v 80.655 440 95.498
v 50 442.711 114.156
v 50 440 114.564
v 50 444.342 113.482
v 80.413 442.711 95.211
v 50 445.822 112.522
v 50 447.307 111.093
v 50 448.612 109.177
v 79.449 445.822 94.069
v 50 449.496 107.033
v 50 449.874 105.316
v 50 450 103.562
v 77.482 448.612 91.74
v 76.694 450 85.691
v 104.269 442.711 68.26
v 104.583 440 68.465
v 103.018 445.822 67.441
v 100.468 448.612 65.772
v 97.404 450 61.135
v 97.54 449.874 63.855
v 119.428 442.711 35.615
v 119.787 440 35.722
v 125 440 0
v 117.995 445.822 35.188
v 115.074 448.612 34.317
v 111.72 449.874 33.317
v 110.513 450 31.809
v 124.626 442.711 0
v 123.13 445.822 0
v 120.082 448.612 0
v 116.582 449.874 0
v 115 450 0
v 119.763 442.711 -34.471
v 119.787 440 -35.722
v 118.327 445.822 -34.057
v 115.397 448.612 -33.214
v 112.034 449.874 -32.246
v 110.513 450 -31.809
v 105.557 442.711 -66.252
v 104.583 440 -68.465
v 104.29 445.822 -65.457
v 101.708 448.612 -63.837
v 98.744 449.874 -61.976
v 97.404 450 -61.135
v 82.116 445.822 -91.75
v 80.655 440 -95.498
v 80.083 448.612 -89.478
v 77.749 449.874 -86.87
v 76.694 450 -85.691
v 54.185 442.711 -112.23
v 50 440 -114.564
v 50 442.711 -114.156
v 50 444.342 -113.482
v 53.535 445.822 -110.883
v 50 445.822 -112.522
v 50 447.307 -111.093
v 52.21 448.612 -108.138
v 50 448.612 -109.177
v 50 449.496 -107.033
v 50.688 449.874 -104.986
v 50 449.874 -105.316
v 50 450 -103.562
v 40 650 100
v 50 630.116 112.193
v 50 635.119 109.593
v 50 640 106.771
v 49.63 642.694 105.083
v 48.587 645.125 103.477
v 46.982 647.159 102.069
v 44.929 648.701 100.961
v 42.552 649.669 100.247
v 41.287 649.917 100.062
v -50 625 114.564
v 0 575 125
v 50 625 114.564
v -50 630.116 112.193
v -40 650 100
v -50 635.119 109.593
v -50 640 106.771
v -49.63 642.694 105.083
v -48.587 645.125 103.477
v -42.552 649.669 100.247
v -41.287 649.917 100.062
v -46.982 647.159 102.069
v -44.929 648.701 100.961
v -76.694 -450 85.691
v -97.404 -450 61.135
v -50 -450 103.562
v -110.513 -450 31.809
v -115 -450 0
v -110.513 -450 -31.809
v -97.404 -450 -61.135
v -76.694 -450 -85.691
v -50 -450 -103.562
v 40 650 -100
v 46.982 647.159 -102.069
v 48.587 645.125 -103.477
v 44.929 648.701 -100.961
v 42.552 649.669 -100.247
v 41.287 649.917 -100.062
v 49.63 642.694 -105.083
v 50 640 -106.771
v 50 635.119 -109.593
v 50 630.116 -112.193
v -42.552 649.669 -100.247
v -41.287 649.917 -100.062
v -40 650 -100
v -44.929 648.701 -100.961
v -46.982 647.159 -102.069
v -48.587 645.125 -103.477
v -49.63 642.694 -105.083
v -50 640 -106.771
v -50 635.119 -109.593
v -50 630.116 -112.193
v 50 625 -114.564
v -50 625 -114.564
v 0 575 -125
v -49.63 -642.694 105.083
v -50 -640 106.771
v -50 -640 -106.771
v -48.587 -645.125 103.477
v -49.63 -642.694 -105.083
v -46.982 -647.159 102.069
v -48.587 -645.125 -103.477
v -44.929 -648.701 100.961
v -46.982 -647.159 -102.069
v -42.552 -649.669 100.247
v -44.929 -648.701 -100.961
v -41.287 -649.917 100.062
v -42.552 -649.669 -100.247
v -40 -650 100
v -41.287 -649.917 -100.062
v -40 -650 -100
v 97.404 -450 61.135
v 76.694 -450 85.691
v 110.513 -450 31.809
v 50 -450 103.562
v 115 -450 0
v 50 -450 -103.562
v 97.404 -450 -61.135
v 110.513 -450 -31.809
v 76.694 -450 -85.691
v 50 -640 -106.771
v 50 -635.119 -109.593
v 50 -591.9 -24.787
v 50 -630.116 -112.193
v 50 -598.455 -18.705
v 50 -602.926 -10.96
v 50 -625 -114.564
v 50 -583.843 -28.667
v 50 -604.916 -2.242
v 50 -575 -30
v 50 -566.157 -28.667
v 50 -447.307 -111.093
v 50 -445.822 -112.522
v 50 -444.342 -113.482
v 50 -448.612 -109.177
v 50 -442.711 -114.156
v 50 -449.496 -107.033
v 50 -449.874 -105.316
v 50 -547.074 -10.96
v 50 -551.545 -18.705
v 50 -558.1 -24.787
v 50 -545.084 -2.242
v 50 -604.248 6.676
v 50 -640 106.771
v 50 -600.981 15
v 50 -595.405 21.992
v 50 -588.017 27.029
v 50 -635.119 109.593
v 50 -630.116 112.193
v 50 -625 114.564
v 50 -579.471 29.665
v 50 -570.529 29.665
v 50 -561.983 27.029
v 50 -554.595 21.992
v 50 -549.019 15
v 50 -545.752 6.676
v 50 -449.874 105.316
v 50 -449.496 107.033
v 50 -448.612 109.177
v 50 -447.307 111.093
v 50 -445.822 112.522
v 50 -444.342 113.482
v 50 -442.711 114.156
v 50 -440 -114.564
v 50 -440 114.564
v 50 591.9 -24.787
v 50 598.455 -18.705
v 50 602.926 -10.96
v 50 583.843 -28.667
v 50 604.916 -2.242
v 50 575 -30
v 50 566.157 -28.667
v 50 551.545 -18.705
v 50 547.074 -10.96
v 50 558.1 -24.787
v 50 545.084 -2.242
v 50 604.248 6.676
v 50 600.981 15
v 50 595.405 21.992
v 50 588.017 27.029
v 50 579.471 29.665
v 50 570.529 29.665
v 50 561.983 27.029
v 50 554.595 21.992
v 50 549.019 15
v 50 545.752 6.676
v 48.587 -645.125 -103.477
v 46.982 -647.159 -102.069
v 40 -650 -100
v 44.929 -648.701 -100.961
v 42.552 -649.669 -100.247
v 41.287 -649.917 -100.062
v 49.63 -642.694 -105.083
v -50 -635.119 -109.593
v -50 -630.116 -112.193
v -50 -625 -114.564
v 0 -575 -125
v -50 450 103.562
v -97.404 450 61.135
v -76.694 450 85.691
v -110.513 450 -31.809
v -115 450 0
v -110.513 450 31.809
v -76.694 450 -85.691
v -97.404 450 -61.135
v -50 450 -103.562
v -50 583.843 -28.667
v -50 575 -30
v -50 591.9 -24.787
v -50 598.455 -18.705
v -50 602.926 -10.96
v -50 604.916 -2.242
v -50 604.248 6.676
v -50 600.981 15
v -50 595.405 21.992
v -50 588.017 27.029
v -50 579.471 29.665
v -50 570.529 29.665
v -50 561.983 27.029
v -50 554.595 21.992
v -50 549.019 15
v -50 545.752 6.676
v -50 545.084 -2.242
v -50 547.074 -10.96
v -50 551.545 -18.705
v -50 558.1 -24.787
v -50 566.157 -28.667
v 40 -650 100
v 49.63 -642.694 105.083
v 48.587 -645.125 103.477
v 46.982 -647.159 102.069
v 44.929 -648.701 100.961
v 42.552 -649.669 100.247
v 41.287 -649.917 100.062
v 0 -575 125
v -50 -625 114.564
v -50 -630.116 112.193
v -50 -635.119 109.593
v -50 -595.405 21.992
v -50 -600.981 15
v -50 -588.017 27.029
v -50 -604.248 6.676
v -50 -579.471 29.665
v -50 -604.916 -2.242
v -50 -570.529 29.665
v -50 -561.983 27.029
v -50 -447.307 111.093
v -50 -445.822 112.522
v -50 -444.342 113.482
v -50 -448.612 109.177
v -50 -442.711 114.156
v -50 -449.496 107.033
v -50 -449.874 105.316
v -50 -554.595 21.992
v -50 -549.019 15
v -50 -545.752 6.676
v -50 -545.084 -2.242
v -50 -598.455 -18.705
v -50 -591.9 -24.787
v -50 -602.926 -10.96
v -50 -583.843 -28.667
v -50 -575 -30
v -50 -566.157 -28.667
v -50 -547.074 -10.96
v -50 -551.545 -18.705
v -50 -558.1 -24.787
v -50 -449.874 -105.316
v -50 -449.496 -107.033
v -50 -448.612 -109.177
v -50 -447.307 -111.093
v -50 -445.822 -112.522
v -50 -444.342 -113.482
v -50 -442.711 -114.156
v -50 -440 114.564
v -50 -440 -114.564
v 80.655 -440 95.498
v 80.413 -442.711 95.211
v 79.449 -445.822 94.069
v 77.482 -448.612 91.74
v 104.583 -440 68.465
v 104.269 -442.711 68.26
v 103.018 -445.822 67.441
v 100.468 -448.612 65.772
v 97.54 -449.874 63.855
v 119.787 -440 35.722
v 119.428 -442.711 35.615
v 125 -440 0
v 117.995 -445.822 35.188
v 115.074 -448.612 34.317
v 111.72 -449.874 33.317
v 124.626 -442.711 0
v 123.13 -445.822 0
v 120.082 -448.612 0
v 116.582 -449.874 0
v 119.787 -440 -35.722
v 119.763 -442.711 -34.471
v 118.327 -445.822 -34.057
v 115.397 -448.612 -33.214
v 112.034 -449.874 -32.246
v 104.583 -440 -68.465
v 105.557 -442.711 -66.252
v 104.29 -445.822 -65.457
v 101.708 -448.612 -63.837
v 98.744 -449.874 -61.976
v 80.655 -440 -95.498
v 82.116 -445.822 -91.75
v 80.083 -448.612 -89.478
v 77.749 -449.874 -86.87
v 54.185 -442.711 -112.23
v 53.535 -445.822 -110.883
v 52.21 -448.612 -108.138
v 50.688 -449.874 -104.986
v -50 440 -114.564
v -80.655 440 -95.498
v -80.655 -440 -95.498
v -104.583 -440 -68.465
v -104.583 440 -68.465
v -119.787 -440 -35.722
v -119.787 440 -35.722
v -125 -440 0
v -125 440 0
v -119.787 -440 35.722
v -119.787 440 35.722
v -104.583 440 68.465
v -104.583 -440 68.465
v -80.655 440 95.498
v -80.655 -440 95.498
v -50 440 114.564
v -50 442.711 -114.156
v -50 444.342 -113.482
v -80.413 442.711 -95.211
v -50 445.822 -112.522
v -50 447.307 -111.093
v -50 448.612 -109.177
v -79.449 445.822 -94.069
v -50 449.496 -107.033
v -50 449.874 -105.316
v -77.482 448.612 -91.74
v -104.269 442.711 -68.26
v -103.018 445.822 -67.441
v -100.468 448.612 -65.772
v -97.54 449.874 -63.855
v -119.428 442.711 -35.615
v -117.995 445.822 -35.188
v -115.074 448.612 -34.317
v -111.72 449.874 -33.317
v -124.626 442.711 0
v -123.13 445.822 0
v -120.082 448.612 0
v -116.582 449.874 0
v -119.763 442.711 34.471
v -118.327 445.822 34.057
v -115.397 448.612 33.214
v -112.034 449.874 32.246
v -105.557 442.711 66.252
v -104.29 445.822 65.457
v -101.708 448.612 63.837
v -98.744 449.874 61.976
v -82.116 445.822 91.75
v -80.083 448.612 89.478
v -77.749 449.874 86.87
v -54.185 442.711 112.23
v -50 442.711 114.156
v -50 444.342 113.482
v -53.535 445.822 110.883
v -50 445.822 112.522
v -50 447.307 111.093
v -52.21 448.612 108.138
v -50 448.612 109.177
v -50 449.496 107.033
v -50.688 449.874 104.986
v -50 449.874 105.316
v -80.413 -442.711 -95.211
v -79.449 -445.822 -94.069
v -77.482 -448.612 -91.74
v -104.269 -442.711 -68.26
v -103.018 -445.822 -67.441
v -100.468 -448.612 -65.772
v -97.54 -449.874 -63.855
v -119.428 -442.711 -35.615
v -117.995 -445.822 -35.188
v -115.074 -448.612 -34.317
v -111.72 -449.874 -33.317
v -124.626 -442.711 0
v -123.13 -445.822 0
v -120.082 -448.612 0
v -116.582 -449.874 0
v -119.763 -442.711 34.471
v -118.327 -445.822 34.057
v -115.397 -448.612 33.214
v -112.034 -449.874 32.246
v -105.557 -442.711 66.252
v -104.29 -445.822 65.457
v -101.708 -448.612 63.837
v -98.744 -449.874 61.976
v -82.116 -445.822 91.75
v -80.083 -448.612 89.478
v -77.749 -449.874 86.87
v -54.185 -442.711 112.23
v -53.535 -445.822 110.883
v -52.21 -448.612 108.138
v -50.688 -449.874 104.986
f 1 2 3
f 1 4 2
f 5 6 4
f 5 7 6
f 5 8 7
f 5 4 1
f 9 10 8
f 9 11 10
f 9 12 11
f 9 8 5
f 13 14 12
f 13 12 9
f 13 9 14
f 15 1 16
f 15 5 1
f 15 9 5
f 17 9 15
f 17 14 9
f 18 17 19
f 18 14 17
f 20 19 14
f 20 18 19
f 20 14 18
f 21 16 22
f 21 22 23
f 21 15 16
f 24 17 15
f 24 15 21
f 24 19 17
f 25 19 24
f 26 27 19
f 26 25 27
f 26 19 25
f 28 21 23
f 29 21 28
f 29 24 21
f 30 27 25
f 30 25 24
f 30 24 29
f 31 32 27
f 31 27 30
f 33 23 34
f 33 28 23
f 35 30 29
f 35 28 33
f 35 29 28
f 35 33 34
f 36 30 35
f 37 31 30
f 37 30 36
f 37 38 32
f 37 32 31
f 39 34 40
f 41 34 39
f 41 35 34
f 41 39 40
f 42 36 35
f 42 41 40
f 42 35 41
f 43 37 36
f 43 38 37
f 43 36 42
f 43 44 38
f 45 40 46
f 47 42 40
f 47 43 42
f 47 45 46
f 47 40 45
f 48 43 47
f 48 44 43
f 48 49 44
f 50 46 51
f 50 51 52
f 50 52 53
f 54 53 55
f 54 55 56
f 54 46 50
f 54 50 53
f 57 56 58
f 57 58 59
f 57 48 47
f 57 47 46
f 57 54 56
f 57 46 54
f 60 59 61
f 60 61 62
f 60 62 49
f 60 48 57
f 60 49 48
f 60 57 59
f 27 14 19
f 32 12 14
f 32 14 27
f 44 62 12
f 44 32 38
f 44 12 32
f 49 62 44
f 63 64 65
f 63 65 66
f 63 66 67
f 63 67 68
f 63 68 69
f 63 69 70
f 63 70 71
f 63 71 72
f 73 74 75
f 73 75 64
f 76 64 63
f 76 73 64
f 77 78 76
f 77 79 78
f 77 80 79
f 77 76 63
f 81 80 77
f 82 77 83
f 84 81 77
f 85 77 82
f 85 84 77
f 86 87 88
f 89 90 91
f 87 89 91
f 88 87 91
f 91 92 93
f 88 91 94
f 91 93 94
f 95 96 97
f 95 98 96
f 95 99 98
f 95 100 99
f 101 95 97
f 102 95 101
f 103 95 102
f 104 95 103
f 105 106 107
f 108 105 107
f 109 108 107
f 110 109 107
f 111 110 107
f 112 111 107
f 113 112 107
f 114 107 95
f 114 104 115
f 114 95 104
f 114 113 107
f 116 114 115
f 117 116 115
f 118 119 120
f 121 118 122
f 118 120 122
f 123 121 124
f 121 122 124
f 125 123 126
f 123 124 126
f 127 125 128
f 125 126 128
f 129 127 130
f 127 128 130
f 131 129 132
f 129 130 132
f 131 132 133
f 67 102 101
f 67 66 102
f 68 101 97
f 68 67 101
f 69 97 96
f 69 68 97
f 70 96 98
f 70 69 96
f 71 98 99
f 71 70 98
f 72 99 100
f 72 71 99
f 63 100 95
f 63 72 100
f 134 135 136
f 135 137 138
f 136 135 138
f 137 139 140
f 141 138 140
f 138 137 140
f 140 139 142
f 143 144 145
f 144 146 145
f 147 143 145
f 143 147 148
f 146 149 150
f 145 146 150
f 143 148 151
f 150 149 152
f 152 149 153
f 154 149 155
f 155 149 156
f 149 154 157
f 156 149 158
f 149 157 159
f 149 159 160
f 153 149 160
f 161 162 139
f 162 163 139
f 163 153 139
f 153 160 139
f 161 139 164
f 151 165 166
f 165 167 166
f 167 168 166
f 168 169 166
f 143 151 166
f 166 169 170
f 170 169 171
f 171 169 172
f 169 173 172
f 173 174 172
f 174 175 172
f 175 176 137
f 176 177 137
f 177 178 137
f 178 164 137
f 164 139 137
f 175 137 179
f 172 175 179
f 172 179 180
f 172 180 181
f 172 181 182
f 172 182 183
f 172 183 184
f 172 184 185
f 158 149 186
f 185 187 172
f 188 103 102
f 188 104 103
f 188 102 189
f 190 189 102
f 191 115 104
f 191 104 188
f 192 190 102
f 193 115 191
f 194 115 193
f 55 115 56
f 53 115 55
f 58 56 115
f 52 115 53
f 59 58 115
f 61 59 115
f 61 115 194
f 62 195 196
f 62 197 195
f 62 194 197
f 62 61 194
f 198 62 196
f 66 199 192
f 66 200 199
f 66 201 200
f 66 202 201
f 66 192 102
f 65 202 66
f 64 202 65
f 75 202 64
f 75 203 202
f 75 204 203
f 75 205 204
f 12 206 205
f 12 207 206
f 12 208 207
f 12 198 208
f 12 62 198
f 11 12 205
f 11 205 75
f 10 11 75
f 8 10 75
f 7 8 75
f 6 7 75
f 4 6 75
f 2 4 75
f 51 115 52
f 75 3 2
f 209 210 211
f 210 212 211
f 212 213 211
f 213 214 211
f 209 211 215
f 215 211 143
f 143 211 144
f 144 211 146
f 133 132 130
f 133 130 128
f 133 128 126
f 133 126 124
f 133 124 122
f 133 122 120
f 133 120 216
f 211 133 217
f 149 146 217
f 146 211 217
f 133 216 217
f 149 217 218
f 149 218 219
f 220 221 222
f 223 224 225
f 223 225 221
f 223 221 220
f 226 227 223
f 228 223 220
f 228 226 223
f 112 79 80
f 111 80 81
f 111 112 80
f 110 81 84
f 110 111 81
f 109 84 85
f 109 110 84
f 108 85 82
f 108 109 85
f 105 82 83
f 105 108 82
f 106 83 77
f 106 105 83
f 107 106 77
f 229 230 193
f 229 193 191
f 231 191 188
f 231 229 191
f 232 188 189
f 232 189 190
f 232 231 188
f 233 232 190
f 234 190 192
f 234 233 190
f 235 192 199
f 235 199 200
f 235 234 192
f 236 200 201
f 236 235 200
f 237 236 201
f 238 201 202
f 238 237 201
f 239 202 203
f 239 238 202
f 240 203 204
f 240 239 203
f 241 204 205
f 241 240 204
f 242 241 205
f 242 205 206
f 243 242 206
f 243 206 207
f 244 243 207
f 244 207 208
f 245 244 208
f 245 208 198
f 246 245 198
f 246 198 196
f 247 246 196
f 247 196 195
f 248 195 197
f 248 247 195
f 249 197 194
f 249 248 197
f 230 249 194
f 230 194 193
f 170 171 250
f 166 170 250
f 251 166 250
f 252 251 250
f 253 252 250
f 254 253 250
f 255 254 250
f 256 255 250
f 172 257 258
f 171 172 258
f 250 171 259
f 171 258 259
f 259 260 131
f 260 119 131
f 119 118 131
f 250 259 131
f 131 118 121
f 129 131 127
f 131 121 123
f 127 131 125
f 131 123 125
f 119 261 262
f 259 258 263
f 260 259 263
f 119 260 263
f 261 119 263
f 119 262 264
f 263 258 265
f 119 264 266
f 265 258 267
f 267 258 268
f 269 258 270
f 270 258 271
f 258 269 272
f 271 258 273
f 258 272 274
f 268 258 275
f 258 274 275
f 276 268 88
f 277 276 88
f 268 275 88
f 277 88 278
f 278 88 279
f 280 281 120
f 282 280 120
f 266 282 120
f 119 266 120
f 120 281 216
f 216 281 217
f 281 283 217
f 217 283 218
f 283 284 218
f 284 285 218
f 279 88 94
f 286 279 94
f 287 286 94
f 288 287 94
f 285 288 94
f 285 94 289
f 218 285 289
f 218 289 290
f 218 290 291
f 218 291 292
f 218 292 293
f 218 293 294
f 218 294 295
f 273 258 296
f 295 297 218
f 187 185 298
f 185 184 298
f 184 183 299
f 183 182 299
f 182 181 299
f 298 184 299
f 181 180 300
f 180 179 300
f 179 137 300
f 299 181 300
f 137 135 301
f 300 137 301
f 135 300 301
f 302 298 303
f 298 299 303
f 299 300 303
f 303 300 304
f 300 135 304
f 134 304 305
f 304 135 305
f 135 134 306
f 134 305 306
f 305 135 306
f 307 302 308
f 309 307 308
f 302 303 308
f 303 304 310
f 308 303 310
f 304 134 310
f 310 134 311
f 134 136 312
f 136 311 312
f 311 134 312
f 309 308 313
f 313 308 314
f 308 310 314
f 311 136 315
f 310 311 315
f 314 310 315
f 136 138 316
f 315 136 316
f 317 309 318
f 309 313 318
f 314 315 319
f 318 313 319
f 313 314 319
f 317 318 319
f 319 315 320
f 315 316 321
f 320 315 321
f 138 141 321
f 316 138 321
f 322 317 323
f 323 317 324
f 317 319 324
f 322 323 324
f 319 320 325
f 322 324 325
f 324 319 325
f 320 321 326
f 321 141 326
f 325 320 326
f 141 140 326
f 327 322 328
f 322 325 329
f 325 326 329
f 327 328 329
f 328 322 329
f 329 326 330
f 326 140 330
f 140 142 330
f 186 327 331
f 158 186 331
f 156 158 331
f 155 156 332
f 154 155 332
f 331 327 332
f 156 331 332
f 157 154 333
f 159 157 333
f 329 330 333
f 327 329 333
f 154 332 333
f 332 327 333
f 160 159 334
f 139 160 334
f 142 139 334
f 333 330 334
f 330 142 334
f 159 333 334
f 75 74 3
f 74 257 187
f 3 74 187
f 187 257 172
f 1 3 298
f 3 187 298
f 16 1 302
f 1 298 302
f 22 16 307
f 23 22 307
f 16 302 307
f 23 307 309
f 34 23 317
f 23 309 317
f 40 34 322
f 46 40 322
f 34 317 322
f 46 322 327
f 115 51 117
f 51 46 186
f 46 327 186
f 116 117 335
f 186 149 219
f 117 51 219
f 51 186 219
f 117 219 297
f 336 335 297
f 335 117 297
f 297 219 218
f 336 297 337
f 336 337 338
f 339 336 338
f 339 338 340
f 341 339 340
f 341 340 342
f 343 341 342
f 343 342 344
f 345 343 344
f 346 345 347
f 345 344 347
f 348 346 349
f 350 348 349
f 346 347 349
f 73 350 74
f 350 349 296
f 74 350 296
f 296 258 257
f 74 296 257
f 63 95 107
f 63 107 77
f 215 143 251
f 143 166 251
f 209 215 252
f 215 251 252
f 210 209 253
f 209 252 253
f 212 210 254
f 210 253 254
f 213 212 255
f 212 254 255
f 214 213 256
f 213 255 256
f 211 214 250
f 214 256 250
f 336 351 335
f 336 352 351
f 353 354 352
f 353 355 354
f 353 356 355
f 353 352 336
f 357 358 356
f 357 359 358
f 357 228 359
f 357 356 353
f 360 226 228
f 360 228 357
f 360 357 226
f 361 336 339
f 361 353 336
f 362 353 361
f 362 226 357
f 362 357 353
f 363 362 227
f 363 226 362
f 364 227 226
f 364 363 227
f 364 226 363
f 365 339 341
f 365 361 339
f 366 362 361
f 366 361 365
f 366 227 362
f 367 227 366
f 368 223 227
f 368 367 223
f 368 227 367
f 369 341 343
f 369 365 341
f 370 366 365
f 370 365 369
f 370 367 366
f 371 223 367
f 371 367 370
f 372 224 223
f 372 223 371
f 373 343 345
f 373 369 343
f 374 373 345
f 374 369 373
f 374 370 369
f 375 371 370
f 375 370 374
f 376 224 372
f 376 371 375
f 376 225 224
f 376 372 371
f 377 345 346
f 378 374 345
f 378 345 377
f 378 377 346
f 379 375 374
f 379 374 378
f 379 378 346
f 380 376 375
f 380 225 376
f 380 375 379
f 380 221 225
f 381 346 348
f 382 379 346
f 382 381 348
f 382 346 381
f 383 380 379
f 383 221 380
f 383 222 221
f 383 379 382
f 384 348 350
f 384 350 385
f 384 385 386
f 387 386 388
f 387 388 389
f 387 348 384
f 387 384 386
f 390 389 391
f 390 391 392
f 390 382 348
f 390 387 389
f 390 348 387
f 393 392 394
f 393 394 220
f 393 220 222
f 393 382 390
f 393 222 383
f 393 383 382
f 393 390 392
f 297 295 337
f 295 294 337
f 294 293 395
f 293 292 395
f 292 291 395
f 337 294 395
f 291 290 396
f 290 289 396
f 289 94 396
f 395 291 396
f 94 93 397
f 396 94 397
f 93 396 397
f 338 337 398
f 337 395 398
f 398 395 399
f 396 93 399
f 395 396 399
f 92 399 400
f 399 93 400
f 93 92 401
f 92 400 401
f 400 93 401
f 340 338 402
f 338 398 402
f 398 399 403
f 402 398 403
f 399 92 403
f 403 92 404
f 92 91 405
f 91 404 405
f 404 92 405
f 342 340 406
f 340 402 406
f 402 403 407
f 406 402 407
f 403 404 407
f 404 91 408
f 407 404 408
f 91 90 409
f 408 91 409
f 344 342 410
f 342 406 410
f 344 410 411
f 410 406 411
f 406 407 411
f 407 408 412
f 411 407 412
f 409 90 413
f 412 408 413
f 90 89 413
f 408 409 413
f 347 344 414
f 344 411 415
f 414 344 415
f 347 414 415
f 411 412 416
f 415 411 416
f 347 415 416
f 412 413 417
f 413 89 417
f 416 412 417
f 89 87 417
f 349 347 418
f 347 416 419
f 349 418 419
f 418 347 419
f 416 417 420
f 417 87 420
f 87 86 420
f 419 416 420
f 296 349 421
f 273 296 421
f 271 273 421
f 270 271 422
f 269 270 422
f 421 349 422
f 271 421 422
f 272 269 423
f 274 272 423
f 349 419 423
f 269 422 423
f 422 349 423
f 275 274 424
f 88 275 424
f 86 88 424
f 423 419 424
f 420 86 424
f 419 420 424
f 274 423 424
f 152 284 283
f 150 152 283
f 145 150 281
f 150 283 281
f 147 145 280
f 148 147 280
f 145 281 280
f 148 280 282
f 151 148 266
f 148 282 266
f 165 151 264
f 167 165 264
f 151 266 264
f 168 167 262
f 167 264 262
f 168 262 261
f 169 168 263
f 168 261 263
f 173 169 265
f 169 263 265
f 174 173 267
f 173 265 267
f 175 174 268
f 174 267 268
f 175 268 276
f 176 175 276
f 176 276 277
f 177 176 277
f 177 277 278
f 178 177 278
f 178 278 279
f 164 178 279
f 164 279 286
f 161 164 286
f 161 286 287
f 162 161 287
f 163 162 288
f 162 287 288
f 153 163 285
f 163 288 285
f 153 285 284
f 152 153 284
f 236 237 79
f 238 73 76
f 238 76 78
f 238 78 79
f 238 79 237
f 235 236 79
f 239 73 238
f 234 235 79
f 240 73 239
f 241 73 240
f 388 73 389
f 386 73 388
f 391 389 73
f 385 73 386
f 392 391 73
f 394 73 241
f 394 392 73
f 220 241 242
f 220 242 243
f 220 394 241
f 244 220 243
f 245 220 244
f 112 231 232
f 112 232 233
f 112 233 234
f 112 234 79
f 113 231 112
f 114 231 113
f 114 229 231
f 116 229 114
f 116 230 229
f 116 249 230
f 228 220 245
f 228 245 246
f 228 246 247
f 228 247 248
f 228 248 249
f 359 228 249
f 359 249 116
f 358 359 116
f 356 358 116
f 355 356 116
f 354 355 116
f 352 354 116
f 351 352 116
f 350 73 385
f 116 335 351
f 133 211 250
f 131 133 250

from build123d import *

# Parameters (mm, degrees)
SKETCH1_R            = 124.99999999999999
BOSS_EXTRUDE1_DEPTH  = 650
CUT_EXTRUDE1_START   = -200
CUT_EXTRUDE1_DEPTH   = 200
SKETCH4_R            = 30.000000000000007
CUT_EXTRUDE4_DEPTH   = 685.6531968814577
FILLET2_R            = 10
FILLET2_OF_MIRROR4_R = 10
FILLET3_R            = 10
FILLET4_R            = 10


with BuildPart() as part:
    # Sketch1 → Boss-Extrude1 (new body)
    with BuildSketch(Plane(origin=(0, 0, 0), x_dir=(1, 0, 0), z_dir=(0, 1, 0))):
        Circle(SKETCH1_R)
    boss_extrude1 = extrude(amount=BOSS_EXTRUDE1_DEPTH)

    # Sketch2 → Cut-Extrude1 (cut)
    with BuildSketch(Plane(origin=(0, 650, 0), x_dir=(1, 0, 0), z_dir=(0, 1, 0)).offset(CUT_EXTRUDE1_START)):
        with BuildLine():
            Line((-50, -114.56439237389277), (-50, 114.56439237389277))
            ThreePointArc((-50.00000000000426, 114.56439237389412), (-124.99999999999999, 1.531e-14), (-50.00000000000437, -114.56439237389408))
        make_face()
        with BuildLine():
            ThreePointArc((49.99999999999955, -114.56439237389618), (124.99999999999999, 7.11e-15), (49.99999999999953, 114.5643923738962))
            Line((50, 114.56439237389633), (50, -114.56439237389633))
        make_face()
    cut_extrude1 = extrude(amount=CUT_EXTRUDE1_DEPTH, mode=Mode.SUBTRACT)

    # Sketch4 → Cut-Extrude4 (cut, through all)
    with BuildSketch(Plane(origin=(50, 0, 0), x_dir=(0, 0, -1), z_dir=(1, 0, 0))):
        with BuildLine():
            Line((124.99999999999999, 575.0000000000001), (124.99999999999999, 650))
            Line((124.99999999999999, 650), (99.99999999999793, 650.0000000000014))
            ThreePointArc((99.99999999999865, 650.0000000000019), (118.58541225631386, 614.5284707521059), (125, 575.0000000000001))
        make_face()
        with BuildLine():
            Line((-99.99999999999793, 650.0000000000014), (-124.99999999999999, 650))
            Line((-124.99999999999999, 650), (-124.99999999999999, 575.0000000000001))
            ThreePointArc((-124.99999999999999, 575.0000000000001), (-118.58541225631386, 614.5284707521059), (-99.99999999999864, 650.0000000000019))
        make_face()
        with Locations((0, 575.0000000000001)):
            Circle(SKETCH4_R)
    cut_extrude4 = extrude(amount=-CUT_EXTRUDE4_DEPTH, mode=Mode.SUBTRACT)

    # Fillet2
    fillet2_edges = [part.edges().sort_by_distance(p)[0] for p in [
        (50, 650, -1.421e-14),
        (-50, 650, 0),
    ]]
    fillet(fillet2_edges, radius=FILLET2_R)

    # Mirror4: Boss-Extrude1, Cut-Extrude1, Cut-Extrude4 across plane
    add(boss_extrude1.mirror(Plane(origin=(0, 0, 0), x_dir=(0, 0, 1), z_dir=(0, -1, 0))))
    add(cut_extrude1.mirror(Plane(origin=(0, 0, 0), x_dir=(0, 0, 1), z_dir=(0, -1, 0))), mode=Mode.SUBTRACT)
    add(cut_extrude4.mirror(Plane(origin=(0, 0, 0), x_dir=(0, 0, 1), z_dir=(0, -1, 0))), mode=Mode.SUBTRACT)

    # Fillet2 of Mirror4
    fillet2_of_mirror4_edges = [part.edges().sort_by_distance(p)[0] for p in [
        (50, -650, -1.421e-14),
        (-50, -650, 0),
    ]]
    fillet(fillet2_of_mirror4_edges, radius=FILLET2_OF_MIRROR4_R)

    # Fillet3
    fillet3_edges = [part.edges().sort_by_distance(p)[0] for p in [
        (104.58250331675968, 450, -68.46531968814539),
        (-124.99999999999999, 450, -6.04e-14),
    ]]
    fillet(fillet3_edges, radius=FILLET3_R)

    # Fillet4
    fillet4_edges = [part.edges().sort_by_distance(p)[0] for p in [
        (-124.99999999999999, -450, -6.04e-14),
        (104.58250331675968, -450, -68.46531968814539),
    ]]
    fillet(fillet4_edges, radius=FILLET4_R)


solid = part.part
